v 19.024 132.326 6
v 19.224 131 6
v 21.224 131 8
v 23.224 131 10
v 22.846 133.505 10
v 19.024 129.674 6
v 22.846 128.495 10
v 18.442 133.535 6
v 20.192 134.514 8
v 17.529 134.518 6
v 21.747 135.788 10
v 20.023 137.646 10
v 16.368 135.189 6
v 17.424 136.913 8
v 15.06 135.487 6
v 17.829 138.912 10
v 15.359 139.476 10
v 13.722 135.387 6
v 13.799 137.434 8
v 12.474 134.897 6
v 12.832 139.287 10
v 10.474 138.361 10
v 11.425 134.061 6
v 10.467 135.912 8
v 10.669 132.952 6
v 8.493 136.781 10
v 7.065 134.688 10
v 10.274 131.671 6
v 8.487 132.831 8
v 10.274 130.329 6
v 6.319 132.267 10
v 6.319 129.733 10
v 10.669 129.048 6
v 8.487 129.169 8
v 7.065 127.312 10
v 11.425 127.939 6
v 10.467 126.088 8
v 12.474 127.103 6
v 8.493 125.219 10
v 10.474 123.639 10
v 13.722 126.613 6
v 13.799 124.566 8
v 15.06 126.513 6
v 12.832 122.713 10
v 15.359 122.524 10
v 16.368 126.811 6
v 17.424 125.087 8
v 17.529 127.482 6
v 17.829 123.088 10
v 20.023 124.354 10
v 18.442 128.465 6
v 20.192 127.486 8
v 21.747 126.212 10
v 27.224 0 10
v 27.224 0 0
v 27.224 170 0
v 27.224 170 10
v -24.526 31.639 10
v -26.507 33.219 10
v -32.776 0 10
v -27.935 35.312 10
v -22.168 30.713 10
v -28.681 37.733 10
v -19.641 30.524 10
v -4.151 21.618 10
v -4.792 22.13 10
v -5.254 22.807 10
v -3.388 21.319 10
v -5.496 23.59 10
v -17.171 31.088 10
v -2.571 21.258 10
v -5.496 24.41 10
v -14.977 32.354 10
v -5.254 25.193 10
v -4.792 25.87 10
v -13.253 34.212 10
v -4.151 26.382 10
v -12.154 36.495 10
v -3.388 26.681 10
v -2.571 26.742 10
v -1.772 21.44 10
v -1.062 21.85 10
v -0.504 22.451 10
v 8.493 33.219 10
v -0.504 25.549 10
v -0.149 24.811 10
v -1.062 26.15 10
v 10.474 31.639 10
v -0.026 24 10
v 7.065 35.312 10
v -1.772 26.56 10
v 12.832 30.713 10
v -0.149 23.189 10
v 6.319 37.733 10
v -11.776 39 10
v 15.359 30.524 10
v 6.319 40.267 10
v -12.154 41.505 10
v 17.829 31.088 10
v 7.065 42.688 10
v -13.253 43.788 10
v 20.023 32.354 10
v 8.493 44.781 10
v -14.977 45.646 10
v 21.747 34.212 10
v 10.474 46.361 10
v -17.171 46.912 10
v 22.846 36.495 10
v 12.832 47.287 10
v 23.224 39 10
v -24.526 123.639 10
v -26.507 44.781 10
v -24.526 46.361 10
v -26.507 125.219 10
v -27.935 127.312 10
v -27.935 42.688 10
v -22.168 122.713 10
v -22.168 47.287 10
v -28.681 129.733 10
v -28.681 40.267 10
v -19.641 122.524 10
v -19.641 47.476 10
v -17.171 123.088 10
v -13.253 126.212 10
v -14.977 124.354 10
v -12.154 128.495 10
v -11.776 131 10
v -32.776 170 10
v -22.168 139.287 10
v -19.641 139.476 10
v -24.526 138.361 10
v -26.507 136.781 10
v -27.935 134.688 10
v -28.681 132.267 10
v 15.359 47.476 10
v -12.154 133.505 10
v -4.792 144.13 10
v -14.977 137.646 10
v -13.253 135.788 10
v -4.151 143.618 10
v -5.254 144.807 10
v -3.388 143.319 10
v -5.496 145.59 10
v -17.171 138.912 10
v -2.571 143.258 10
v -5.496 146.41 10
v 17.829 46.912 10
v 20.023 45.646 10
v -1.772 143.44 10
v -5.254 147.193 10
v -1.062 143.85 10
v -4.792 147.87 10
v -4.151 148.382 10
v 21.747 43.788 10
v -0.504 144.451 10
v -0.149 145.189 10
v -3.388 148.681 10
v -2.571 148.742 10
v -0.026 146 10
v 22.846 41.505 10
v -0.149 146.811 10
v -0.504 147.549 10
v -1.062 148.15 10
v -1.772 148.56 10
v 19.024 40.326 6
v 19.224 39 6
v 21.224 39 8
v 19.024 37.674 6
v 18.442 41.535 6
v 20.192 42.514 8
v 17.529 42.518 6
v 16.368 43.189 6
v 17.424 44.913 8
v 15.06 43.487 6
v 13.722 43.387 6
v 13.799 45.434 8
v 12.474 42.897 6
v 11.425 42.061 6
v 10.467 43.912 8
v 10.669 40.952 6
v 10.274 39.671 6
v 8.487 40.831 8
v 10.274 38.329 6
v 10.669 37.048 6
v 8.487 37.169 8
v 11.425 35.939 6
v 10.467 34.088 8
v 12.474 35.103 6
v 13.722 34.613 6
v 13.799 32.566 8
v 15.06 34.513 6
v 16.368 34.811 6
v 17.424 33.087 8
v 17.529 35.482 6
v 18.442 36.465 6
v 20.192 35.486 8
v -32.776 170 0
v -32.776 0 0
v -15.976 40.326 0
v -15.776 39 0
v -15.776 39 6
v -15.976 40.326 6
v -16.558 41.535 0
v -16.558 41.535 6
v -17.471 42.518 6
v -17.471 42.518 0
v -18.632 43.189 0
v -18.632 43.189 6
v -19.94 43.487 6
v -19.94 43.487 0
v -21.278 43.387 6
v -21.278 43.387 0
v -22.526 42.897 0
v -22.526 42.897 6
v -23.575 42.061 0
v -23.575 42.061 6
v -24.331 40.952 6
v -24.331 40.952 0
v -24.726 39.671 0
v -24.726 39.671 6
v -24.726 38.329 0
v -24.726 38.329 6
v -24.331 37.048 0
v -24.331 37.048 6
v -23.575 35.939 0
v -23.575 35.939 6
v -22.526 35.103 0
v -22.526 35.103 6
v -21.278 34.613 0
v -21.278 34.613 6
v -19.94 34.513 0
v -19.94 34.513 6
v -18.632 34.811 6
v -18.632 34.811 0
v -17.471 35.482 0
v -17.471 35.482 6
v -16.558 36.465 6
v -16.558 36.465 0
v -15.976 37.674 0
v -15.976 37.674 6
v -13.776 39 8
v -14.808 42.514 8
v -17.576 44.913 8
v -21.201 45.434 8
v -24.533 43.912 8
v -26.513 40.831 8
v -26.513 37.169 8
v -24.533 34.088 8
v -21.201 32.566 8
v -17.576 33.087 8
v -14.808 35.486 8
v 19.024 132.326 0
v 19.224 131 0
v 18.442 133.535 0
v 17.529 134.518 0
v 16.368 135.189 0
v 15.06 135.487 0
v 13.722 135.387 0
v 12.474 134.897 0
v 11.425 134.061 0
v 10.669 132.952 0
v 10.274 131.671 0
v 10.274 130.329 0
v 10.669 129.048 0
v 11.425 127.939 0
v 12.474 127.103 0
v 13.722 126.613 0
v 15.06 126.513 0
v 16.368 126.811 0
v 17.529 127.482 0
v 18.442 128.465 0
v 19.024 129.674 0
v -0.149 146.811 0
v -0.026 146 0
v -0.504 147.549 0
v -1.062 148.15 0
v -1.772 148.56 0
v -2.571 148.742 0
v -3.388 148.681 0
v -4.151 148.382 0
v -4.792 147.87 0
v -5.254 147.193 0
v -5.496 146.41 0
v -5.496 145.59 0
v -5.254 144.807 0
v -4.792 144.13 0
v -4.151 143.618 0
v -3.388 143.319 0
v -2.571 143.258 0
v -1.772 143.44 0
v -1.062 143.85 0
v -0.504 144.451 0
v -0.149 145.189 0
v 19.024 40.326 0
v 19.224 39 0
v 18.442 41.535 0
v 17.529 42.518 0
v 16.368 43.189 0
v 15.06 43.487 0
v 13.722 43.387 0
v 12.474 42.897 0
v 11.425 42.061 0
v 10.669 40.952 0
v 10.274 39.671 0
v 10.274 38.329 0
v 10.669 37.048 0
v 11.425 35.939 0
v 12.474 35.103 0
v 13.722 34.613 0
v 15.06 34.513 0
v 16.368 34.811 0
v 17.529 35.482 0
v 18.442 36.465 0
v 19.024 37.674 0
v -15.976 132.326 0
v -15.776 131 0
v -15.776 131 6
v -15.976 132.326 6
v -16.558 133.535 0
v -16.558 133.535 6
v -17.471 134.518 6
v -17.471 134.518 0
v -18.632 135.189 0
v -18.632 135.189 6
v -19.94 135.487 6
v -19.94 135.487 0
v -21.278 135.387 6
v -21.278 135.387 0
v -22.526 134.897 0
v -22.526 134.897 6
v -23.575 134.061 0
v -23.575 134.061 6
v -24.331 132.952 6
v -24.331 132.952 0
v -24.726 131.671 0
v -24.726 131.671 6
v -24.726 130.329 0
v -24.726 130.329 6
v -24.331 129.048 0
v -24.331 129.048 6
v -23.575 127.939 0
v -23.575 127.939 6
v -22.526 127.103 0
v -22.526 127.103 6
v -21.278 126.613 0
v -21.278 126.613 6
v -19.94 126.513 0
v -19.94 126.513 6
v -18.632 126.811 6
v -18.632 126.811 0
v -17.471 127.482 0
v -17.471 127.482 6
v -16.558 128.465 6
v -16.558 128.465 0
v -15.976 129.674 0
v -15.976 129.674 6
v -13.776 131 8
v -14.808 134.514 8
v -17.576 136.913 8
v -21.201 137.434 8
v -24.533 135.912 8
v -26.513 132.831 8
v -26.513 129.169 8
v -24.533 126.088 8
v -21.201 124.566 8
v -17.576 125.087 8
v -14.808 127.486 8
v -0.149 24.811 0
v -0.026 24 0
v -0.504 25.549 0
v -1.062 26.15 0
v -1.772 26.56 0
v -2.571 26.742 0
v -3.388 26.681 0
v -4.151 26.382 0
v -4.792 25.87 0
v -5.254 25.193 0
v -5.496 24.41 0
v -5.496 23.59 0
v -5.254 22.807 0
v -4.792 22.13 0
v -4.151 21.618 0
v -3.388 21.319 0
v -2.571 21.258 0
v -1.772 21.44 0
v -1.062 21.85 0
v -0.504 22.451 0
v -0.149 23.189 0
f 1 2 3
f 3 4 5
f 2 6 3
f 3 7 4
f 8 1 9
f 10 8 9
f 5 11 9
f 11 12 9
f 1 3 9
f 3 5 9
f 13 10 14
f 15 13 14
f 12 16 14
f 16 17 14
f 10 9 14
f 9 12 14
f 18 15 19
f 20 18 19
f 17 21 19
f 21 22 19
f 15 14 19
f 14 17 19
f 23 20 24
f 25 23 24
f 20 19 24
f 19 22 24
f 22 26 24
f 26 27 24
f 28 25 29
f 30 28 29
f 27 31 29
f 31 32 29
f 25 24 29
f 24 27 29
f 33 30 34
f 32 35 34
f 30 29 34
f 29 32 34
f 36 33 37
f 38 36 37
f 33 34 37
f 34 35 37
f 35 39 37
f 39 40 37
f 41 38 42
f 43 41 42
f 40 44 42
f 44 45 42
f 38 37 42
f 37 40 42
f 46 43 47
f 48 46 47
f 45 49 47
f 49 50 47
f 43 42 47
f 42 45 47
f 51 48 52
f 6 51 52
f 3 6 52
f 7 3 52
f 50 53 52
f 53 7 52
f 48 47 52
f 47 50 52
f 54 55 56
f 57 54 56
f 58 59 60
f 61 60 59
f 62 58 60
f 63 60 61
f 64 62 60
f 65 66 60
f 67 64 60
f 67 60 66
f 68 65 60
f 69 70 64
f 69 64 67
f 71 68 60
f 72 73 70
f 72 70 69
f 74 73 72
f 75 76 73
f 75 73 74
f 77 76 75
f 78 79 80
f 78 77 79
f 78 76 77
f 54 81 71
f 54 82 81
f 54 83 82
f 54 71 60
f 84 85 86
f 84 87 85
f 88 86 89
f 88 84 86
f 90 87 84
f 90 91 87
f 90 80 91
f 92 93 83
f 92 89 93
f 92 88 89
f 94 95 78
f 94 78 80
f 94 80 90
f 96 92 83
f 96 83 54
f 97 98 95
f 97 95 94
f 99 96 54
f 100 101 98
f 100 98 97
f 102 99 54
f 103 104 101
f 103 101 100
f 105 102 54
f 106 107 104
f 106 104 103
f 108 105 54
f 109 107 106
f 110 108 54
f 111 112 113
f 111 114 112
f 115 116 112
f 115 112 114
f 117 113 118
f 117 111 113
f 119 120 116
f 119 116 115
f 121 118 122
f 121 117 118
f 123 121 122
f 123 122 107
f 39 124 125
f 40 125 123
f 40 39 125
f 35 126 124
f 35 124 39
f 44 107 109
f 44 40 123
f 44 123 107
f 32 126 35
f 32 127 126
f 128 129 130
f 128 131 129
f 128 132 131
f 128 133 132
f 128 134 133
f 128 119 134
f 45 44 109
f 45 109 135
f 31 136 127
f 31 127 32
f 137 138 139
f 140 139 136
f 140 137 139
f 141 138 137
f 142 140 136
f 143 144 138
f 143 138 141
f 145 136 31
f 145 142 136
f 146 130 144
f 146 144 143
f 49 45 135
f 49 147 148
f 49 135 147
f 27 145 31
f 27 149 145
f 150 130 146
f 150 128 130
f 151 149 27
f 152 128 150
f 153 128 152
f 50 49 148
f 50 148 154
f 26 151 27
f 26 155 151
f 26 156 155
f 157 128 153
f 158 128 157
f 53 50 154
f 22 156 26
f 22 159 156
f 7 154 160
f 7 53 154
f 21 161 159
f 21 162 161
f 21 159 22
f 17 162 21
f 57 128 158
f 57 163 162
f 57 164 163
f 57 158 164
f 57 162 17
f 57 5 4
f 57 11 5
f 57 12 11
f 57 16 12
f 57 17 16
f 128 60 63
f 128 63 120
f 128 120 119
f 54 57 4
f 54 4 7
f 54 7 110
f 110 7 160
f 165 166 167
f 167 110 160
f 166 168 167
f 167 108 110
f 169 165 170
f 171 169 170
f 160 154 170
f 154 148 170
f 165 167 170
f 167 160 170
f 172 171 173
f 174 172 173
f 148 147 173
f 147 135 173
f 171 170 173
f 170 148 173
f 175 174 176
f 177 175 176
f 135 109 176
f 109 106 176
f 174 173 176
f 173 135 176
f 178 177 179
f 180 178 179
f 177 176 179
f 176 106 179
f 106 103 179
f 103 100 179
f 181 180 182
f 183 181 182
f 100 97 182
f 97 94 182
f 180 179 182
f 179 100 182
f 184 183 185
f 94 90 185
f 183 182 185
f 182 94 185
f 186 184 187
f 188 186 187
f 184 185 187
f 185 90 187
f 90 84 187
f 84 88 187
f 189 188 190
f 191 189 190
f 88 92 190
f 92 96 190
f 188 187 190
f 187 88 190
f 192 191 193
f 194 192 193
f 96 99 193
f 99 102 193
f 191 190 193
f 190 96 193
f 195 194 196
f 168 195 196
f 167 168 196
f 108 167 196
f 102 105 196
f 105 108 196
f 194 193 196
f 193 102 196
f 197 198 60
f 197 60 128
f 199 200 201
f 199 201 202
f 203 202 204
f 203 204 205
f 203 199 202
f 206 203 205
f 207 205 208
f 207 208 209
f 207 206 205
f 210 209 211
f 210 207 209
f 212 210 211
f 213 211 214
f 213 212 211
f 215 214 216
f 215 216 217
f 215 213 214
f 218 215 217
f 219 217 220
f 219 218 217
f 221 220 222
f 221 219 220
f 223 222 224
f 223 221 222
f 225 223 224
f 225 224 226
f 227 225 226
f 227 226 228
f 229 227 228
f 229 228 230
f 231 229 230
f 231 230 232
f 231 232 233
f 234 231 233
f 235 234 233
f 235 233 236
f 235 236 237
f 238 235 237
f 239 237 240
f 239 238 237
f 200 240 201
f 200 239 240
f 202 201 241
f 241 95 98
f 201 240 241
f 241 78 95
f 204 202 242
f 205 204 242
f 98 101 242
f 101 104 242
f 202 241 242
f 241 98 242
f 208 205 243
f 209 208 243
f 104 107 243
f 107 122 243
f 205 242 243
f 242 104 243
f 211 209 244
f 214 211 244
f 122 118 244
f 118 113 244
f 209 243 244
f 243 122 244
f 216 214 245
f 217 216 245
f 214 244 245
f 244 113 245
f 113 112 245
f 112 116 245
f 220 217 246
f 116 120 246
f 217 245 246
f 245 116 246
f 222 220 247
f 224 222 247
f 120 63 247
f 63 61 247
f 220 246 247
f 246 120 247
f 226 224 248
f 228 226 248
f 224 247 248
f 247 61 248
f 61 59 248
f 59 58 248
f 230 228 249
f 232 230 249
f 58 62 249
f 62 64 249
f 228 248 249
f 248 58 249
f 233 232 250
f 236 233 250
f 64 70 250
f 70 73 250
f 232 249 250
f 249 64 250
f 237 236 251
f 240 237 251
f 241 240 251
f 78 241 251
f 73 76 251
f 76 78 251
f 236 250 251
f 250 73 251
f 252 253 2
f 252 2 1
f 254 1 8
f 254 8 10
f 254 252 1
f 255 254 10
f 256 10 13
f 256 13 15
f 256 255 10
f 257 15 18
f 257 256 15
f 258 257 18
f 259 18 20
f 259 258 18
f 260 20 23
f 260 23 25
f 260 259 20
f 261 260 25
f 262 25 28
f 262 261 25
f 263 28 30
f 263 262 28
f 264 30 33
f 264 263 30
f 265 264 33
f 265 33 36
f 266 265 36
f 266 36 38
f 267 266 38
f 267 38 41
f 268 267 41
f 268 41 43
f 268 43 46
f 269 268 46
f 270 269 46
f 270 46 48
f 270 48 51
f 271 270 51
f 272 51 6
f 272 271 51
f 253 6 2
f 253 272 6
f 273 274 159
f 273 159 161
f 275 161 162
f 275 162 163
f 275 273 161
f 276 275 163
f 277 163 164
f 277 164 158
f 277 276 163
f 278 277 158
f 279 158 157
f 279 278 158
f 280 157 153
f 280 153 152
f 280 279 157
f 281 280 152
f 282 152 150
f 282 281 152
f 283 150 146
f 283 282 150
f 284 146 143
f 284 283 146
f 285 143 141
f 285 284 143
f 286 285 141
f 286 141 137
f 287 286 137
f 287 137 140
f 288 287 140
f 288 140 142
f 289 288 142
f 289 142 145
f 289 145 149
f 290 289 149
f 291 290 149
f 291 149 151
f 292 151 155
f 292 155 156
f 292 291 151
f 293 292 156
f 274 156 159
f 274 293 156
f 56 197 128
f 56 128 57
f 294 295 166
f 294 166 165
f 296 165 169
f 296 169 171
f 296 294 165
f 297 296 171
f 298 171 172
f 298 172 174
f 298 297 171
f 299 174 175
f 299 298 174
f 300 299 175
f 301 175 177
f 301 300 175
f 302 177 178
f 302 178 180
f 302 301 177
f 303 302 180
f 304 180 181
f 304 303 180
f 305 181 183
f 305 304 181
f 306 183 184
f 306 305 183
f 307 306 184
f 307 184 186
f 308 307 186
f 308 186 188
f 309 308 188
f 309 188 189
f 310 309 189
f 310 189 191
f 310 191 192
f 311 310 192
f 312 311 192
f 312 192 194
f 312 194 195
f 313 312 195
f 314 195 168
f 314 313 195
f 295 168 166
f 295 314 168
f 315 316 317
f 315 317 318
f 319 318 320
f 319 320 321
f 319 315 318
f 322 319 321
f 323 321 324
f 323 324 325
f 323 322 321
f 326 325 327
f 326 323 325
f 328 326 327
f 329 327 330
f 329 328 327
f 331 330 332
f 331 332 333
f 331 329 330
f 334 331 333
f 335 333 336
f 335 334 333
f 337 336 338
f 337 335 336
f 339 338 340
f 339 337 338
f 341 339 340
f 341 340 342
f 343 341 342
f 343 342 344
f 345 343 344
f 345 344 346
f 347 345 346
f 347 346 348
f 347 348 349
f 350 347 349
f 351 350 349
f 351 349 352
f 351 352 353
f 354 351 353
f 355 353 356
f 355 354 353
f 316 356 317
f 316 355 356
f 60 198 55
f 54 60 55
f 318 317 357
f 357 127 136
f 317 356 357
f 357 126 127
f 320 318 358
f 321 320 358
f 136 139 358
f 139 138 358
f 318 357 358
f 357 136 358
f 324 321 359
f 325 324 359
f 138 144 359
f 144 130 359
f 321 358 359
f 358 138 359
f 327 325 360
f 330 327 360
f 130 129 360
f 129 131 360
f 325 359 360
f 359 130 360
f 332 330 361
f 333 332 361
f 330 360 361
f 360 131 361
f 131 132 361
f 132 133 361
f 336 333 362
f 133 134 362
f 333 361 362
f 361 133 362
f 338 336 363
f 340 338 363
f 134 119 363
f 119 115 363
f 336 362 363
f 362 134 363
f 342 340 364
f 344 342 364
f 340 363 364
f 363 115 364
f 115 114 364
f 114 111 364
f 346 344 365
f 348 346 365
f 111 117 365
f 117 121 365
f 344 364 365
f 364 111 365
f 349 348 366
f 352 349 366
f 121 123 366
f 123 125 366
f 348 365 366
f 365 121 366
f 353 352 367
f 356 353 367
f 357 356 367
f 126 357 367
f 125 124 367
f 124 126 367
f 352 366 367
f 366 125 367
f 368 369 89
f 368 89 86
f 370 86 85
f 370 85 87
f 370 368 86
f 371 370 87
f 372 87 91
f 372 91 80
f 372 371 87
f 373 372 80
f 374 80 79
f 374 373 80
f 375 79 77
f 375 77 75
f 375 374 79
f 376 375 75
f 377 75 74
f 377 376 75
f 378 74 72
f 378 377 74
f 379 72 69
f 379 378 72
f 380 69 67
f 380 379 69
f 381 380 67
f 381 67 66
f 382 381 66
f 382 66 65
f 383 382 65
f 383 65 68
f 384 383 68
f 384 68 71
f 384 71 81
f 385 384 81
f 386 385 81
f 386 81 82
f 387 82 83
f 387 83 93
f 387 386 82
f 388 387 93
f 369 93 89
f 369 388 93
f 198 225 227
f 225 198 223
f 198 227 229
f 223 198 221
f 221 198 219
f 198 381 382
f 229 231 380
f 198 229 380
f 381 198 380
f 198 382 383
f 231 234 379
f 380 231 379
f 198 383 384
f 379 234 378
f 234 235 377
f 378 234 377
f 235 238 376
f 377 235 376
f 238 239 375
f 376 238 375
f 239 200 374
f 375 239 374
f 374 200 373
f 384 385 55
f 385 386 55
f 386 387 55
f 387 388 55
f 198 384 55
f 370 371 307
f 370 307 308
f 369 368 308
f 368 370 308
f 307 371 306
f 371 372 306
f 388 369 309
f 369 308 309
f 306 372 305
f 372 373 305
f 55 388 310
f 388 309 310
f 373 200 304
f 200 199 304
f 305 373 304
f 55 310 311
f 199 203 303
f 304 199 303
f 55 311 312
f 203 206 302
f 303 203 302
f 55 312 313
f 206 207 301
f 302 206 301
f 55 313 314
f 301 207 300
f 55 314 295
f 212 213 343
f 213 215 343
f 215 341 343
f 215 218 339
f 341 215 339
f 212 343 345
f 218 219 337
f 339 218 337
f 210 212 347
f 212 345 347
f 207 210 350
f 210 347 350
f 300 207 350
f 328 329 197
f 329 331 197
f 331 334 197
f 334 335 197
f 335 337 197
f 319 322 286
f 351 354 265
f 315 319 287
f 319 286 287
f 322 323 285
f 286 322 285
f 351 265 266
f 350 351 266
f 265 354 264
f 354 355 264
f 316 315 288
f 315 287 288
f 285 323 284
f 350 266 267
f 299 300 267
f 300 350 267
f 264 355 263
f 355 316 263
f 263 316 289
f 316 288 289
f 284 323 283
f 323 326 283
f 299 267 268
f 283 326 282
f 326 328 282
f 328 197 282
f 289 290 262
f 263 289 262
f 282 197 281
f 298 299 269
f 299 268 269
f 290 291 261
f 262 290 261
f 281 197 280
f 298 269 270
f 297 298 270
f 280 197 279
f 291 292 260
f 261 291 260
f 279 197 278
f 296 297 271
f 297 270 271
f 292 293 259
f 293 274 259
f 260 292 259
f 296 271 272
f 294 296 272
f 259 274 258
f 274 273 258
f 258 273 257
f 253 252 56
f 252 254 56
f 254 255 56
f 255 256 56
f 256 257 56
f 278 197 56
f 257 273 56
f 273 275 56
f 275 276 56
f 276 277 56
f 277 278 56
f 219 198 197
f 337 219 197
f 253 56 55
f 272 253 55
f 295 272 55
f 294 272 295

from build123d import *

# Parameters (mm, degrees)
F0_W     = 60
F0_H     = 170
F0_R     = 4.5
F0_R_2   = 2.75
F1_DEPTH = 10
F2_SIZE  = 4


with BuildPart() as f1:
    # F0 (on Top) → F1 (new body)
    with BuildSketch(Plane.XY):
        with Locations((-2.776433, 85)):
            Rectangle(F0_W, F0_H)
        with Locations((-20.276433, 39)):
            Circle(F0_R, mode=Mode.SUBTRACT)
        with Locations((-2.776433, 24)):
            Circle(F0_R_2, mode=Mode.SUBTRACT)
        with Locations((14.723567, 39)):
            Circle(F0_R, mode=Mode.SUBTRACT)
        with Locations((-20.276433, 131)):
            Circle(F0_R, mode=Mode.SUBTRACT)
        with Locations((-2.776433, 146)):
            Circle(F0_R_2, mode=Mode.SUBTRACT)
        with Locations((14.723567, 131)):
            Circle(F0_R, mode=Mode.SUBTRACT)
    extrude(amount=F1_DEPTH)

    # F2
    f2_edges = [f1.edges().sort_by_distance(p)[0] for p in [
        (-24.776433, 39, 10),
        (10.223567, 39, 10),
        (10.223567, 131, 10),
        (-24.776433, 131, 10),
    ]]
    chamfer(f2_edges, length=F2_SIZE)


solid = f1.part
